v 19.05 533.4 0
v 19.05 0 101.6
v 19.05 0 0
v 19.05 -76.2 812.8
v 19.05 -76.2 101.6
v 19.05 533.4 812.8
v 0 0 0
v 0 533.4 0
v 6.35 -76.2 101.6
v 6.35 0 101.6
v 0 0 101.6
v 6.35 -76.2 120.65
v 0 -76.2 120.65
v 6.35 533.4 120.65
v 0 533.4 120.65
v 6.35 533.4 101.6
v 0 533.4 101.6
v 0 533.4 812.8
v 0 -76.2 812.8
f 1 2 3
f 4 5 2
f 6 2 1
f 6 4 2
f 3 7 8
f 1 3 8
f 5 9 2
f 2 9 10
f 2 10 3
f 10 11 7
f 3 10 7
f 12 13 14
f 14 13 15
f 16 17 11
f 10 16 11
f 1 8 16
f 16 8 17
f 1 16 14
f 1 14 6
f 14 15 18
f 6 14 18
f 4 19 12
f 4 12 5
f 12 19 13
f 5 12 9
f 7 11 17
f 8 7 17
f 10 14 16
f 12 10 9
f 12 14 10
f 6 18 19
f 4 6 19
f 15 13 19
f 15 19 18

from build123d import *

# Parameters (mm, degrees)
F1_DEPTH = 19.05
F3_DEPTH = 6.35


with BuildPart() as f1:
    # F0 (on Right) → F1 (new body)
    with BuildSketch(Plane.YZ):
        Polygon((0, 101.6), (0, 0), (533.4, 0), (533.4, 812.8), (-76.2, 812.8), (-76.2, 101.6), align=None)
    extrude(amount=F1_DEPTH)

    # F2 (on face) → F3 (cut)
    with BuildSketch(Plane(origin=(0, 0, 0), x_dir=(0, -1, 0), z_dir=(-1, 0, 0))):
        Polygon((0, 101.6), (76.2, 101.6), (76.2, 120.65), (-533.4, 120.65), (-533.4, 101.6), align=None)
    extrude(amount=-F3_DEPTH, mode=Mode.SUBTRACT)


solid = f1.part
